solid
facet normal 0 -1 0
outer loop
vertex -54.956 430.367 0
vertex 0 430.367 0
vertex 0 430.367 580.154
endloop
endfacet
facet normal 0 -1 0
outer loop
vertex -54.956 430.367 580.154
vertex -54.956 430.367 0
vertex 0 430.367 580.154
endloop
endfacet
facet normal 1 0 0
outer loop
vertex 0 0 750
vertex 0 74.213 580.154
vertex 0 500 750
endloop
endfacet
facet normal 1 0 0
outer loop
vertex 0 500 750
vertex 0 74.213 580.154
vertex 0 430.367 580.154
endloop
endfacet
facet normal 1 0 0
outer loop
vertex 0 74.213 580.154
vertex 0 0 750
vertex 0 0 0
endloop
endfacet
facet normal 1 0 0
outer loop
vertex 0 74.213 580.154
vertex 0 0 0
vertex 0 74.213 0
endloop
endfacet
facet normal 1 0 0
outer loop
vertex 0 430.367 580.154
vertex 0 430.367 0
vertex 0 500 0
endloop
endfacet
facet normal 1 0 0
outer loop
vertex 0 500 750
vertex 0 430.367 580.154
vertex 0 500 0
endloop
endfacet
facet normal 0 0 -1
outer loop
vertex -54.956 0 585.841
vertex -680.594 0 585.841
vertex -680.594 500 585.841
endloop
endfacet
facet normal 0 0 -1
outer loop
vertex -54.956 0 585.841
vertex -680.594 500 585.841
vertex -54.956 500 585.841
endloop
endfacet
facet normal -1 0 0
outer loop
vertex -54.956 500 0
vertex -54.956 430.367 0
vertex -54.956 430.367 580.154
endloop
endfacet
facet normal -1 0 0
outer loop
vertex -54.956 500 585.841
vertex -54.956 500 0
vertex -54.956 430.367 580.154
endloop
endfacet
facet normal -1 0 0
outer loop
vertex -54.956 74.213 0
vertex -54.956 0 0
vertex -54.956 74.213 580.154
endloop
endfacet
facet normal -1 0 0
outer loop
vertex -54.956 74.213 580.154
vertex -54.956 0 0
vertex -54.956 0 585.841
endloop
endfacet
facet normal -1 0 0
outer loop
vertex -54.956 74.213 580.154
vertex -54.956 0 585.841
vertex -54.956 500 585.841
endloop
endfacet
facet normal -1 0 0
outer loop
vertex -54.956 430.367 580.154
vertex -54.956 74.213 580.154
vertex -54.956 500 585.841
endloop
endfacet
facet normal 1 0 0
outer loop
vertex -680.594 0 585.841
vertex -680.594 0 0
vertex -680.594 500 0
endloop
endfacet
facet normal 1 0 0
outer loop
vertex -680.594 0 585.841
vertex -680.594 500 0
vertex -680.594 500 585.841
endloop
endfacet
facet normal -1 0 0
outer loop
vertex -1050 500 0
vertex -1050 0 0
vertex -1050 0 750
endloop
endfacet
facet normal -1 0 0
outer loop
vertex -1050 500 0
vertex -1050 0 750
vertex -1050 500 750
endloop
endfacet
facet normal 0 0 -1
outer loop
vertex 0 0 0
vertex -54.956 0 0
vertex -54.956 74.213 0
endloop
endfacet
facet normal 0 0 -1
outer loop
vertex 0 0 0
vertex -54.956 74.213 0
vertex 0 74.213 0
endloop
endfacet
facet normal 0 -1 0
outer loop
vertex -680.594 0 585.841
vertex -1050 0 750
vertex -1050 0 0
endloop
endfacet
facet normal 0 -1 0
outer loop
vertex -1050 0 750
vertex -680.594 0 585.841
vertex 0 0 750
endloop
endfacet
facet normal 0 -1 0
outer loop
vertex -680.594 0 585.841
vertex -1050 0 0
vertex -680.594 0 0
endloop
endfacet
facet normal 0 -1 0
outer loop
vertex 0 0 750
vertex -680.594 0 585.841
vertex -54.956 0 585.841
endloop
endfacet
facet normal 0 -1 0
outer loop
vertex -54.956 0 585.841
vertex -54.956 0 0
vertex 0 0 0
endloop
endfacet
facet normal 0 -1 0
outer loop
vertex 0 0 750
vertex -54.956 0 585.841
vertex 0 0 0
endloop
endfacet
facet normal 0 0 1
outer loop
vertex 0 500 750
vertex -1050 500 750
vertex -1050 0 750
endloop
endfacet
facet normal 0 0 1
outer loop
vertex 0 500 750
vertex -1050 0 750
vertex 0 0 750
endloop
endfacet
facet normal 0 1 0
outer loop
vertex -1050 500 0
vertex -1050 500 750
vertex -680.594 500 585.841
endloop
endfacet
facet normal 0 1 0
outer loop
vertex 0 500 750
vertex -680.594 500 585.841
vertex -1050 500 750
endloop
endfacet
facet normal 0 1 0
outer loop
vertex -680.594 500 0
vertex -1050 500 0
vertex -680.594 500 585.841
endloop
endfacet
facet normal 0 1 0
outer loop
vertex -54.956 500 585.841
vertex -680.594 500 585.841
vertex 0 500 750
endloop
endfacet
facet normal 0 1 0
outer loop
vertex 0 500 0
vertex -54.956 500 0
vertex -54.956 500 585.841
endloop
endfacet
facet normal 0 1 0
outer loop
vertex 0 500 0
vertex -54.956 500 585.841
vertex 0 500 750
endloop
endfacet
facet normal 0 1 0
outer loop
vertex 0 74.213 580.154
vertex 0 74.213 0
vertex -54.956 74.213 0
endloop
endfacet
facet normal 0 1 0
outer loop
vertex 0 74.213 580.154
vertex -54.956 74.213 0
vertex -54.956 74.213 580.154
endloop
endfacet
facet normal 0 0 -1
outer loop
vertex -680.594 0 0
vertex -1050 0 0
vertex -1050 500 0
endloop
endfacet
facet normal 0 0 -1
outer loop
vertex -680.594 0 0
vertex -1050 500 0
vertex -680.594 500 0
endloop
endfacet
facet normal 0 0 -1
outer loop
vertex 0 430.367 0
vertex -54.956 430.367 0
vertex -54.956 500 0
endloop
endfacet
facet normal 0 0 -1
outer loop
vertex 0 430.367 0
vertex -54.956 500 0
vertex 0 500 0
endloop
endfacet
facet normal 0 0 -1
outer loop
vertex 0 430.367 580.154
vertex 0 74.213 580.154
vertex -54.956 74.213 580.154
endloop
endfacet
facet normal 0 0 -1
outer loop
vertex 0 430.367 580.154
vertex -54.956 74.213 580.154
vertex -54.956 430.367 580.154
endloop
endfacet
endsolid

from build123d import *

# Parameters (mm, degrees)
F0_W     = 1050
F0_H     = 500
F1_DEPTH = 750
F2_W     = 625.638008
F2_H     = 585.840762
F3_DEPTH = 500
F4_W     = 356.15398
F4_H     = 580.154359
F5_DEPTH = 54.955602


with BuildPart() as f1:
    # F0 (on Top) → F1 (new body)
    with BuildSketch(Plane.XY):
        with Locations((-525, 250)):
            Rectangle(F0_W, F0_H)
    extrude(amount=F1_DEPTH)

    # F2 (on face) → F3 (cut, through all)
    with BuildSketch(Plane.XZ):
        with Locations((-367.774606, 292.920381)):
            Rectangle(F2_W, F2_H)
    extrude(amount=-F3_DEPTH, mode=Mode.SUBTRACT)

    # F4 (on face) → F5 (cut, through all)
    with BuildSketch(Plane.YZ):
        with Locations((252.290092, 290.077179)):
            Rectangle(F4_W, F4_H)
    extrude(amount=-F5_DEPTH, mode=Mode.SUBTRACT)


solid = f1.part
